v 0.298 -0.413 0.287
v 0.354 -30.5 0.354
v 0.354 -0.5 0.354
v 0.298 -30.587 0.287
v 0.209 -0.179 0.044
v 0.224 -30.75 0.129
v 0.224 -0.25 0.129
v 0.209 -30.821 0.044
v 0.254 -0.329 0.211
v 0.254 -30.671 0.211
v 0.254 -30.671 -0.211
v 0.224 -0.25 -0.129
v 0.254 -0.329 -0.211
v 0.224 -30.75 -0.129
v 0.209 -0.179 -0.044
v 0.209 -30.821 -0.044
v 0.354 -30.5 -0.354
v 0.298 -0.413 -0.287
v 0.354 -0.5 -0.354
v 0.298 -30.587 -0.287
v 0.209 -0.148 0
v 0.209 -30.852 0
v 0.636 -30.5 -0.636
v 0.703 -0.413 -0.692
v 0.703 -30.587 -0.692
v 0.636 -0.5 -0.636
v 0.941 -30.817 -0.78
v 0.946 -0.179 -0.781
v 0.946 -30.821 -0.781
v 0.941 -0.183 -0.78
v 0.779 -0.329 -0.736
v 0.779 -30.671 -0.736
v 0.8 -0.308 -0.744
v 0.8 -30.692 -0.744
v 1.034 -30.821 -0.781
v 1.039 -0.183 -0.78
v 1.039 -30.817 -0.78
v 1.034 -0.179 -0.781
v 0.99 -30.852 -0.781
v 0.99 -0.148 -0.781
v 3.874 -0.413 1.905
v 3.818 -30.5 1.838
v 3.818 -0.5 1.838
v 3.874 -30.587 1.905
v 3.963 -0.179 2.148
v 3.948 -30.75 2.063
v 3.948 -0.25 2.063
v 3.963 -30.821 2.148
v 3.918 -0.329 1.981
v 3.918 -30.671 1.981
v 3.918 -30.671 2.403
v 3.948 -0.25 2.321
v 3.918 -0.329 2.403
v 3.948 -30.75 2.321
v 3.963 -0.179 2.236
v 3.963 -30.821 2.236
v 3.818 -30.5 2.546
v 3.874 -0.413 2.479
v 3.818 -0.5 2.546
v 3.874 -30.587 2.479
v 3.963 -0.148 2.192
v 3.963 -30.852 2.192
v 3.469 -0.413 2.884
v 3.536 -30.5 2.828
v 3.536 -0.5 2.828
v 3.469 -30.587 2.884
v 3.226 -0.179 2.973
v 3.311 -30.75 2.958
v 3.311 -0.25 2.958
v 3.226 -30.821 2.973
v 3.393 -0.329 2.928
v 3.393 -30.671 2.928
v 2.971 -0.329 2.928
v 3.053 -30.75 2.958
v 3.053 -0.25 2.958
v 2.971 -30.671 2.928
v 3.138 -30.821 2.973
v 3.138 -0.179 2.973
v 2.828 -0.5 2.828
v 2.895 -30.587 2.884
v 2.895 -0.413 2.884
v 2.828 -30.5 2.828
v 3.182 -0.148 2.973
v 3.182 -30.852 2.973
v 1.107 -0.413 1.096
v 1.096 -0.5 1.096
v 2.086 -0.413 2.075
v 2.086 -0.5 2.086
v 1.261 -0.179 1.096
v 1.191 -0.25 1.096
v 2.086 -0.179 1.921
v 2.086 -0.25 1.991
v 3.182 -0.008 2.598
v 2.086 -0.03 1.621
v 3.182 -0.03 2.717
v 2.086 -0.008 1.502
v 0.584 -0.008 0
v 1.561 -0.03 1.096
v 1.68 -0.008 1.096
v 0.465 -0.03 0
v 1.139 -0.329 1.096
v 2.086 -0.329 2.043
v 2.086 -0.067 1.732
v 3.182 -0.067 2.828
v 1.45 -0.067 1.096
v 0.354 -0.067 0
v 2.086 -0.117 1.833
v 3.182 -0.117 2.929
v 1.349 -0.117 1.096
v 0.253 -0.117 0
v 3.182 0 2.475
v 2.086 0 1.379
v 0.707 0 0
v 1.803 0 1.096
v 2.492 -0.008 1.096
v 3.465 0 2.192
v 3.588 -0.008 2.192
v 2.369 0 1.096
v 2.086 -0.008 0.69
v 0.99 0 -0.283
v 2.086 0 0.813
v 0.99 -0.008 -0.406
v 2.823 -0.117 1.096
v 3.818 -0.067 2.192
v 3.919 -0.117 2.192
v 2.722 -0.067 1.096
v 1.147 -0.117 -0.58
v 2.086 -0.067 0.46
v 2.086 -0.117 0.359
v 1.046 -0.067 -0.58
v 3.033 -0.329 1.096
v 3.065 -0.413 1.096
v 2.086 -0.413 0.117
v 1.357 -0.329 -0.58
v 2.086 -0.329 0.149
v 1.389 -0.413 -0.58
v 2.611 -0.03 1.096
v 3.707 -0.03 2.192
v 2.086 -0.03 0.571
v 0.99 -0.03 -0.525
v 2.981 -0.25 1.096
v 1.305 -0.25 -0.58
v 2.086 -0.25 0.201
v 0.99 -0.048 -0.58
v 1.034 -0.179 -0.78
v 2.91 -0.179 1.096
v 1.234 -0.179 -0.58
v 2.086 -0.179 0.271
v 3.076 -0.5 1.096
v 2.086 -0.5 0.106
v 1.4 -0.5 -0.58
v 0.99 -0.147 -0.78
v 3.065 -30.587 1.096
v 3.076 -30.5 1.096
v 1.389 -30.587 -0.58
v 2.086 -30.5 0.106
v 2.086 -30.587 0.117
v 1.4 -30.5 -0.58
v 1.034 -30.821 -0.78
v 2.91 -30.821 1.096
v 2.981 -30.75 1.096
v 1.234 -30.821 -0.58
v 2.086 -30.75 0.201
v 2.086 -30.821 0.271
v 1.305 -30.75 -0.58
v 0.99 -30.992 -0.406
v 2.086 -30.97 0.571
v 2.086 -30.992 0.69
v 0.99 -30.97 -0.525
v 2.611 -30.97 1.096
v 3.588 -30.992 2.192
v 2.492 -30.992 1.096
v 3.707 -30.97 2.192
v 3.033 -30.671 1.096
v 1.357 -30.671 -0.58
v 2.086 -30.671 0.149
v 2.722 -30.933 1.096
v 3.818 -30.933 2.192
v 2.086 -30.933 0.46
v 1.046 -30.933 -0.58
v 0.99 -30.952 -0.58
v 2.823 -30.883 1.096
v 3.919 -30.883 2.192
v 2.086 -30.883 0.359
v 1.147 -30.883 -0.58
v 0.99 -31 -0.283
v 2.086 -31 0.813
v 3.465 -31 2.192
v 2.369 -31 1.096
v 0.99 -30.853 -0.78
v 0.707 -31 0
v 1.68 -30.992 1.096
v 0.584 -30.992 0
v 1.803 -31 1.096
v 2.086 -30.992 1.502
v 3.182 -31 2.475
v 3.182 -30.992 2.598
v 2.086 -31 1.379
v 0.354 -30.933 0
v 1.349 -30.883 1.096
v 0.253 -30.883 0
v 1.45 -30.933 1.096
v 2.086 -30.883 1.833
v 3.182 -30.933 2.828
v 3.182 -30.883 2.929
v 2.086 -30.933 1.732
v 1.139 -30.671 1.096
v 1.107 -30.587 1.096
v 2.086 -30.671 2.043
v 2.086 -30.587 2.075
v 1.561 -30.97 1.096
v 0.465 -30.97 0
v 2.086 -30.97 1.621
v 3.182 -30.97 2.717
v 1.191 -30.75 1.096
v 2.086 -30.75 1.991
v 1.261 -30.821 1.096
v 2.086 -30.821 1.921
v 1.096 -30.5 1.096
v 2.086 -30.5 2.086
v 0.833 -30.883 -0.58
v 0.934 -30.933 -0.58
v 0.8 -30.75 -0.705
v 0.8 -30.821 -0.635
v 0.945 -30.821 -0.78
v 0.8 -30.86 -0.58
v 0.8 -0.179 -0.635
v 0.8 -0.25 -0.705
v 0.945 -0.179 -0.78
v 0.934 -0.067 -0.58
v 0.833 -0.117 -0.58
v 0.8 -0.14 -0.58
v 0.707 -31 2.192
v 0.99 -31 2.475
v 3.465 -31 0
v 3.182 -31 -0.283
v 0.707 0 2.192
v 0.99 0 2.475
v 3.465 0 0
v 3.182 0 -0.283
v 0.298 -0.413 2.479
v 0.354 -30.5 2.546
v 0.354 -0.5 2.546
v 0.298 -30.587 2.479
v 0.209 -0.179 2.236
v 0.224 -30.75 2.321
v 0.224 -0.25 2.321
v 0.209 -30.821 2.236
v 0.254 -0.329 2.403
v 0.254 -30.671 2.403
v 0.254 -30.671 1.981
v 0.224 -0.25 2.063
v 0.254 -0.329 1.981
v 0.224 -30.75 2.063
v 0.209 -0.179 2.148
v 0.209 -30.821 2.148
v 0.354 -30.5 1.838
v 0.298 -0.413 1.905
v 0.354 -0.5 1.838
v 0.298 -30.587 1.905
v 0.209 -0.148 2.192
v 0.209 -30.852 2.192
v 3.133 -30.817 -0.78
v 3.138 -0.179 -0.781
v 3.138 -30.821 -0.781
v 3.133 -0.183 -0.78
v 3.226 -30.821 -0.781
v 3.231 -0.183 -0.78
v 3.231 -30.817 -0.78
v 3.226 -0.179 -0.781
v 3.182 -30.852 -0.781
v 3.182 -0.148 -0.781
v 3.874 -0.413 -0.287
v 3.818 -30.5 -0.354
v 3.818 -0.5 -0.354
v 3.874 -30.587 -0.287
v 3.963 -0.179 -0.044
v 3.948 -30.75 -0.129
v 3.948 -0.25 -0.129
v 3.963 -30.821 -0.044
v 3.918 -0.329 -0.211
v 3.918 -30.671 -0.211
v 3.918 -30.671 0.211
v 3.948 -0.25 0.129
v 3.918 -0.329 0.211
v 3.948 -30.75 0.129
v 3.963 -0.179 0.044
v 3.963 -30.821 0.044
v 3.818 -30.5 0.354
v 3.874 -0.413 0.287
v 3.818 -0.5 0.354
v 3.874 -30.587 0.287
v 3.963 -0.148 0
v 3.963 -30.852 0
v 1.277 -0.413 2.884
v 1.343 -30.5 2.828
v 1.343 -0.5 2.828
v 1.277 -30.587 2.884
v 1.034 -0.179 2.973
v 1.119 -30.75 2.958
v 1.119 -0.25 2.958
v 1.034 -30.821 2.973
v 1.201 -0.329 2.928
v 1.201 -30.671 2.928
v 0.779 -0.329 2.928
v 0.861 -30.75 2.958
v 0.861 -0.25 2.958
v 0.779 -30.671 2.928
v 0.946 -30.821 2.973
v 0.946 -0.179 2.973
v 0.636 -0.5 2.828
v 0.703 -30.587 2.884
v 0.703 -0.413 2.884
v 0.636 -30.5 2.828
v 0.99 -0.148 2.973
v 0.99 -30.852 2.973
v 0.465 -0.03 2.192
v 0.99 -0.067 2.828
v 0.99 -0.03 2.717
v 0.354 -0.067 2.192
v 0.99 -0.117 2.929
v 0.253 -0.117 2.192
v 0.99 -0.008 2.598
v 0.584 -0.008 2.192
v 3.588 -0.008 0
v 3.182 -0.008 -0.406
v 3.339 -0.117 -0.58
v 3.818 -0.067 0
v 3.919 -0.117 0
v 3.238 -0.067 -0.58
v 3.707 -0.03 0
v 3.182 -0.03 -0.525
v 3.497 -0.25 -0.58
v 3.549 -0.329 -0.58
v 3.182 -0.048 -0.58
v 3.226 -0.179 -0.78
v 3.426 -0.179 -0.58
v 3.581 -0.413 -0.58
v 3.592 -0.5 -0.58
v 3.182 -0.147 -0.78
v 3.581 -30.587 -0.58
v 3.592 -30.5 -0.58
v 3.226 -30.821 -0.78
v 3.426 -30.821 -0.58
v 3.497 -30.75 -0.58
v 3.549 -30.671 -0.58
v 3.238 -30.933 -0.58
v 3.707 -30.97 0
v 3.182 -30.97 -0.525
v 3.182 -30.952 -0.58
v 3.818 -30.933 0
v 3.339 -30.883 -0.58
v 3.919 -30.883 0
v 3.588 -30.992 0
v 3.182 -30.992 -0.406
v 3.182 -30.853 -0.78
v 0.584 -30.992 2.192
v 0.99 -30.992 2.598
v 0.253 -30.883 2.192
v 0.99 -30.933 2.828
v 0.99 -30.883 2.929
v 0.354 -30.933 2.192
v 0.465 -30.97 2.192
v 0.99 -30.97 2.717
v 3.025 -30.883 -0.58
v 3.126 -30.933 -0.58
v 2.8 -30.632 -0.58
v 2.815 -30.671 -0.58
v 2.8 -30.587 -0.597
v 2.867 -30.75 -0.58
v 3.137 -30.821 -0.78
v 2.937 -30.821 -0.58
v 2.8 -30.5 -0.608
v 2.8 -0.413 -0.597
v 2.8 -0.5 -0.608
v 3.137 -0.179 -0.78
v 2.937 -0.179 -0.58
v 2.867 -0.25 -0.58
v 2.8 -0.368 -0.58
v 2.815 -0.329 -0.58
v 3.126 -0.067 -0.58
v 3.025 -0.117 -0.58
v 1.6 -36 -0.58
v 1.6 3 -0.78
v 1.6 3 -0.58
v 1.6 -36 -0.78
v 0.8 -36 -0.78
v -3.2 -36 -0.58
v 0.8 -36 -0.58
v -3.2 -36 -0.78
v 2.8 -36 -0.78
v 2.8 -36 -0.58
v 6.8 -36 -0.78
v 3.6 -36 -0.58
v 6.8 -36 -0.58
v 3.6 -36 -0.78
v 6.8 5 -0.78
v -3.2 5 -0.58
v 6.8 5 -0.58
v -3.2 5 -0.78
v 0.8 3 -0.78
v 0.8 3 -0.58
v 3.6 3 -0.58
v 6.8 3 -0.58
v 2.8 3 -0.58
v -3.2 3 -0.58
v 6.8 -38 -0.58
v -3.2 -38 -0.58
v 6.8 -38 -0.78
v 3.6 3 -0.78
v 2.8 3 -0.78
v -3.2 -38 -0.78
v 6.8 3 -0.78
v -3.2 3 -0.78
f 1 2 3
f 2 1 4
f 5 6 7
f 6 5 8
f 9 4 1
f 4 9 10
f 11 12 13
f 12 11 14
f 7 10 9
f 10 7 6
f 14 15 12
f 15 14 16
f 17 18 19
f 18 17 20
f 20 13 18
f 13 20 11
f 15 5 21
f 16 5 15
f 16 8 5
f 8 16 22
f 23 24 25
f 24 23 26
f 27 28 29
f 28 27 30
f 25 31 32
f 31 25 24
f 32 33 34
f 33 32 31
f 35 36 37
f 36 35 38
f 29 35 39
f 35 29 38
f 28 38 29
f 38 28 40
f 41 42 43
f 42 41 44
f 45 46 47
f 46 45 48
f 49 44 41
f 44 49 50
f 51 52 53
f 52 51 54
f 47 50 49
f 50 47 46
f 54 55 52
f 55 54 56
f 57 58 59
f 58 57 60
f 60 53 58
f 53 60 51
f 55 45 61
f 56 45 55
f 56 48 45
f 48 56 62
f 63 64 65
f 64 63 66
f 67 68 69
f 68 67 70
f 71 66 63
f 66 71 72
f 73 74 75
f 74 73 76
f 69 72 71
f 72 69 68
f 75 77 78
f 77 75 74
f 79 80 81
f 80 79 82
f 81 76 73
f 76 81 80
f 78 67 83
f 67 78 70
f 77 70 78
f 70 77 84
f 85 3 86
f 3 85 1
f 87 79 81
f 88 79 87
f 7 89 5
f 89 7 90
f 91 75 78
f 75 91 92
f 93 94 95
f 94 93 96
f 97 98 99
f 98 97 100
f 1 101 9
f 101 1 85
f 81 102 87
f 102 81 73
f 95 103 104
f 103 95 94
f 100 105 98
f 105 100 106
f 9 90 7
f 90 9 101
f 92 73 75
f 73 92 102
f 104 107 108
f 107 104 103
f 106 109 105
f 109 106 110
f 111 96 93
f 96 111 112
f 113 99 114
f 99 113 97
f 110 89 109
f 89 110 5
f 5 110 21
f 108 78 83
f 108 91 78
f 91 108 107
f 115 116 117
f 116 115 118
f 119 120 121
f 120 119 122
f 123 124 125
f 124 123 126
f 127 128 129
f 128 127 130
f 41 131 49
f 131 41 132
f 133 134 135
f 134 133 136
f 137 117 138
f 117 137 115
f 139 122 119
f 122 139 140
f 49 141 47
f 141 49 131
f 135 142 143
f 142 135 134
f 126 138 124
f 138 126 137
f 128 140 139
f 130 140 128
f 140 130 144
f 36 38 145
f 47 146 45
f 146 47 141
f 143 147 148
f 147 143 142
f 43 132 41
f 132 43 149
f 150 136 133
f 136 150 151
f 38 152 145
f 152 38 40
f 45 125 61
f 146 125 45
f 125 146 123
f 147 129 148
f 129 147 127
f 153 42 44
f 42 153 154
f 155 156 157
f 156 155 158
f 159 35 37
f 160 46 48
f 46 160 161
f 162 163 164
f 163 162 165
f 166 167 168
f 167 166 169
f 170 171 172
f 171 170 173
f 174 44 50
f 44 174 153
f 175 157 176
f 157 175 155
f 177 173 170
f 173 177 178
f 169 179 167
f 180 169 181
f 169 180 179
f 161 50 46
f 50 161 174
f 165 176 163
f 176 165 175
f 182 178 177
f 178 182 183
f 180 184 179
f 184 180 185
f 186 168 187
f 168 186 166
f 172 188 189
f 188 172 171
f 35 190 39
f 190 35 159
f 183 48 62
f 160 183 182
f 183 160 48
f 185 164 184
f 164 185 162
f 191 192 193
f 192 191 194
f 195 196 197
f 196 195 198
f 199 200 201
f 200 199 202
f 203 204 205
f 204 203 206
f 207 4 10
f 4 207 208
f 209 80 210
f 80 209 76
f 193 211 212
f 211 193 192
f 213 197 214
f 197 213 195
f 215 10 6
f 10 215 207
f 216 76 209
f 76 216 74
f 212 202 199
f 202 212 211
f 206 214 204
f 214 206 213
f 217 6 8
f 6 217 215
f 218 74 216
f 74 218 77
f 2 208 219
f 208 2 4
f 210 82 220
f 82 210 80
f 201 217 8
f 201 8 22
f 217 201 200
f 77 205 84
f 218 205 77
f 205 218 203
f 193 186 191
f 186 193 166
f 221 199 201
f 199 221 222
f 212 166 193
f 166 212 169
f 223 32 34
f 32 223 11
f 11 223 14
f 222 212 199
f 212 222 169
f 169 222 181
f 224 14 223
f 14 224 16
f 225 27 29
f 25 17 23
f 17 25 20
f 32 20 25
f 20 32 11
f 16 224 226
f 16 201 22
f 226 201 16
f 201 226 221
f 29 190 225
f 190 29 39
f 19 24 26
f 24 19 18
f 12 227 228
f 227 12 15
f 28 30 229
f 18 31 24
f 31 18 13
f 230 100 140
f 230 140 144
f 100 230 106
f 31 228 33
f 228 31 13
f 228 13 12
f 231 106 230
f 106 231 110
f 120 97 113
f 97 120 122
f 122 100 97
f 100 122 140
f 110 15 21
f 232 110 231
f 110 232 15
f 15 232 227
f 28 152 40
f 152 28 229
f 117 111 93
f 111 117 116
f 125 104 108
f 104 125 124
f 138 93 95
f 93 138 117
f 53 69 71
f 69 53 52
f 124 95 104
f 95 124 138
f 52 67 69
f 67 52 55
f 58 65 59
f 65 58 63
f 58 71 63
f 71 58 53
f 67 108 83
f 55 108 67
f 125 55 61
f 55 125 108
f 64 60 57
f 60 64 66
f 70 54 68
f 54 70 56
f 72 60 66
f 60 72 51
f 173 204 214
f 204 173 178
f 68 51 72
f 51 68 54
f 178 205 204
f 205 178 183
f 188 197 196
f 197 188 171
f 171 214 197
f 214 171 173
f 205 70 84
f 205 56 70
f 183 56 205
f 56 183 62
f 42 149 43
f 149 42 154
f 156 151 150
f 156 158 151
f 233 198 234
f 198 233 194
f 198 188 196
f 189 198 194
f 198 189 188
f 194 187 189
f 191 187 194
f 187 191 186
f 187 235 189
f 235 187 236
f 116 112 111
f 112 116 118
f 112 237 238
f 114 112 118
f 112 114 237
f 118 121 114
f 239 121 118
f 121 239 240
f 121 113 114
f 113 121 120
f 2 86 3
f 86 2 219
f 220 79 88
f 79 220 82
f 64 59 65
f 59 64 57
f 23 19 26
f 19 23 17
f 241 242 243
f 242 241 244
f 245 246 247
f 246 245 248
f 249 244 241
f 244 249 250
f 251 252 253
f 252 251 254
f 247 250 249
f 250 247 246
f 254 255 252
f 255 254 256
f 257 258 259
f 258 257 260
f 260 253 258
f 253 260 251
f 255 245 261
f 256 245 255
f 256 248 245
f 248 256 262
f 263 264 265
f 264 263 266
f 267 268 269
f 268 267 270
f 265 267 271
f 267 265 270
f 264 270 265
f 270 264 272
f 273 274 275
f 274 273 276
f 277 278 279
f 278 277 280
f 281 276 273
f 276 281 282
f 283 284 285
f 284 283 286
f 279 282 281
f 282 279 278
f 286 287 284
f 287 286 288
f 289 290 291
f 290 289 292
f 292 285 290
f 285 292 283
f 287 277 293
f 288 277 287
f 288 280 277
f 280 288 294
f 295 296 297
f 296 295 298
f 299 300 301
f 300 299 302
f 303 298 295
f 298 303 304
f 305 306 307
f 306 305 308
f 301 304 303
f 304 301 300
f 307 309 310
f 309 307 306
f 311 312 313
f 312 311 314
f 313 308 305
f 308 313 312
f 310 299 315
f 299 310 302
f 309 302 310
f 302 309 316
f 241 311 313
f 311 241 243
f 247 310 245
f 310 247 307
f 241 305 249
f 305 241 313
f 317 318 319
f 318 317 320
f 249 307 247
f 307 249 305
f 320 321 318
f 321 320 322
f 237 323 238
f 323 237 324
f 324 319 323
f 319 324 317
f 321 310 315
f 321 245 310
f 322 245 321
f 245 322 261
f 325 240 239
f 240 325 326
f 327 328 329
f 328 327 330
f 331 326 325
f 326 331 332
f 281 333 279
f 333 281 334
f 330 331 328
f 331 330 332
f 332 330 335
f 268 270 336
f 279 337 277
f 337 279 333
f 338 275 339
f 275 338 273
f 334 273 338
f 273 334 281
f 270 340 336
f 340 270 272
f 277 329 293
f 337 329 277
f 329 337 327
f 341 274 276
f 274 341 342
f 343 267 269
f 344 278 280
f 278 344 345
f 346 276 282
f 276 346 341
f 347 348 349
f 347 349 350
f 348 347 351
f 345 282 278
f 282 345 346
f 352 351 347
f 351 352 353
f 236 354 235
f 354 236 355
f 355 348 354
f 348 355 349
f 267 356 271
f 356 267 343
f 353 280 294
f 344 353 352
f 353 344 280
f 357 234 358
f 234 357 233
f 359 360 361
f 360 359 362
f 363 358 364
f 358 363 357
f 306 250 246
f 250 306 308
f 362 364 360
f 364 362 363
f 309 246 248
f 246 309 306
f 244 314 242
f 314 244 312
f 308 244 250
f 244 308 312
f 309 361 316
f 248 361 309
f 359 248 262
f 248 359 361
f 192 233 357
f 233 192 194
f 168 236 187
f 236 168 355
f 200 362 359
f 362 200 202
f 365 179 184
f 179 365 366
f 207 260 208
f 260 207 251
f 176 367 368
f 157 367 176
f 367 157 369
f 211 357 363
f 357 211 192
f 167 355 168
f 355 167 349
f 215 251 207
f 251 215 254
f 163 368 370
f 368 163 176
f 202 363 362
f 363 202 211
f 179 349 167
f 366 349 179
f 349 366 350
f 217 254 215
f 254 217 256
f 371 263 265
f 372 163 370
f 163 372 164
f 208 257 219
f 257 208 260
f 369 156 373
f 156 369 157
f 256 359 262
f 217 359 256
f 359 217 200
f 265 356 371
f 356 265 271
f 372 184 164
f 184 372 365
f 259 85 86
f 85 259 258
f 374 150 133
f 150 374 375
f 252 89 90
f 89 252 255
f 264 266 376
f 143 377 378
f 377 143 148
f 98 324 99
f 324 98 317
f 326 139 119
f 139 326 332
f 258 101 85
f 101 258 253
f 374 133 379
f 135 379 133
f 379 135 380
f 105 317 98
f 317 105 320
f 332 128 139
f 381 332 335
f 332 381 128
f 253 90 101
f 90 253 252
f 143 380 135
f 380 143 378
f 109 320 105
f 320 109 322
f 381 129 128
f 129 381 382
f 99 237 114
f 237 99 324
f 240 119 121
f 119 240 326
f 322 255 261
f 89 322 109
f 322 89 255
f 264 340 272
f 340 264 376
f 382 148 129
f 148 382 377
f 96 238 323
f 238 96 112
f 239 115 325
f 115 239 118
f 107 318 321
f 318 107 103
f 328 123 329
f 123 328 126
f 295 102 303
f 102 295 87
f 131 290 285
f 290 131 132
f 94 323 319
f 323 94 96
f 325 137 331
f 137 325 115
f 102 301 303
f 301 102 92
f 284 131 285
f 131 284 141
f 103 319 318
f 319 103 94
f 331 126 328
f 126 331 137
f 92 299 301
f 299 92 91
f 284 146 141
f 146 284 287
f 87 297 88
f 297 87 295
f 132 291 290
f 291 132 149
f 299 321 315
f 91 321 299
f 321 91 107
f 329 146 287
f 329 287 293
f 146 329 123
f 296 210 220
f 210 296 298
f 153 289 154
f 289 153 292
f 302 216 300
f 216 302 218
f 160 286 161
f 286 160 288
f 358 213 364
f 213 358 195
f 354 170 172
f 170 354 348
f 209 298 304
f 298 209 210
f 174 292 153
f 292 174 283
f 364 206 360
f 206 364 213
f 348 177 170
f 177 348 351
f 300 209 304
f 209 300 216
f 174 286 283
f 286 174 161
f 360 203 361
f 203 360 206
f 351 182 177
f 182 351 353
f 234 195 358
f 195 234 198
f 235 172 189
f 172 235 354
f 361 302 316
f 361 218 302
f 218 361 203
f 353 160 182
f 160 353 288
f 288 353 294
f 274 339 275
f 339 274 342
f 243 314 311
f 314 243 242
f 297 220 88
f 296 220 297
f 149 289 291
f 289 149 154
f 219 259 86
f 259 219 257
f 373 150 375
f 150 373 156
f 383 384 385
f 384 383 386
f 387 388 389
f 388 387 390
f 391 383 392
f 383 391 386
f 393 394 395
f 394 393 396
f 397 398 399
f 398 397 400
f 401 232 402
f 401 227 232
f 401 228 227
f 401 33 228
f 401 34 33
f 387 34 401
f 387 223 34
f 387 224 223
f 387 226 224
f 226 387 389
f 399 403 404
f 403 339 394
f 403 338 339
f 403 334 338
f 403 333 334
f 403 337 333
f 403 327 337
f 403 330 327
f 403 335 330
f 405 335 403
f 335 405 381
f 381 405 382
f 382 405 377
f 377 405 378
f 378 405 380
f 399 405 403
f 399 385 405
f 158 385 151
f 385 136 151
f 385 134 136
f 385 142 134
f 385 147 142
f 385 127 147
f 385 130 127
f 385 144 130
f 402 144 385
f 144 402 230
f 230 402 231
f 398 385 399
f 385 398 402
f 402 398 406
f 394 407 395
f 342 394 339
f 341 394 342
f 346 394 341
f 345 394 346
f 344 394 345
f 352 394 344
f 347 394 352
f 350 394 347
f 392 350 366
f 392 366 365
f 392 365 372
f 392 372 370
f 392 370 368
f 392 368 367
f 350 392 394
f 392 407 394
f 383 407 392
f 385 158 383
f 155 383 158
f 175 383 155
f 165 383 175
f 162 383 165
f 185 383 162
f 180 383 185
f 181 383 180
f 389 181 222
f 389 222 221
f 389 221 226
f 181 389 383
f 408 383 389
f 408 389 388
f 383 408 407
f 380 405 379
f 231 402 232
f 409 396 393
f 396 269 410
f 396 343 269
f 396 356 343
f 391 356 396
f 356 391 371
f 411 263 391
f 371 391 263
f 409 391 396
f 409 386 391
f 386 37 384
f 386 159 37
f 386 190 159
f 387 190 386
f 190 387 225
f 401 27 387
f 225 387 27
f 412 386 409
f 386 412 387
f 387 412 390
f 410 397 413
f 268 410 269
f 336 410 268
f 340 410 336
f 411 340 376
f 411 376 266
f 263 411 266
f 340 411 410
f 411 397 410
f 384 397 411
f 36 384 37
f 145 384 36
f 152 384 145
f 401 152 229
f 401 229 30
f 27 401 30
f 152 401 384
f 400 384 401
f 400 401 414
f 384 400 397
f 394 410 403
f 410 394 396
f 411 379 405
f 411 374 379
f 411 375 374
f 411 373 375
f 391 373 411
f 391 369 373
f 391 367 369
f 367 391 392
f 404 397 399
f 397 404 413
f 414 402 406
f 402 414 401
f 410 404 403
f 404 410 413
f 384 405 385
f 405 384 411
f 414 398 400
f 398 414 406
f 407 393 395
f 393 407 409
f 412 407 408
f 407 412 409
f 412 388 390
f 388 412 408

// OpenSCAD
// file: lib.scad
// modules not related to bricks

// --  rounded cylinder ---------------------------------------------------------------------------------------

// produces a cylinder in 3 sections
// d: base diameter
// h: total height
// rt: top section height
// rtw: top section diameter difference
// rb: bottom section height
// rbw: bottom section diameter difference
module rounded_cylinder(d,h,rt,rtw,rb,rbw,fn=36){
    cylinder(d2=d,d1=d-rbw,h=rb,$fn=fn);
    translate([0,0,rb])
    cylinder(d=d,h=h-rb-rt,$fn=fn);
    translate([0,0,h-rt])
    cylinder(d1=d,d2=d-rtw,h=rt,$fn=fn);    
}


// -- roundedcube ----------------------------------------------------------------------------------------------



// rounded cube --
// original idea:
// https://stackoverflow.com/questions/33146741/way-to-round-edges-of-objects-openscad


module __neg_round_edge(height,radius,fn=36){
  difference(){
    translate([-.5,-.5,0])
      cube([radius+.5,radius+.5,height]);
      translate([radius,radius,height/2+1]) cylinder(height+3,radius,radius,true,$fn=fn);
   }
}


module __neg_round_edges(xx,yy,zz,radius,cf=[1,1,1,1]){
  if (cf[0]>0) 
    __neg_round_edge(zz,cf[0]*radius);  
  if (cf[1]>0) 
    translate([xx,0,0]) rotate([0,0,90]) __neg_round_edge(zz,cf[1]*radius);  
  if (cf[2]>0) 
     translate([xx,yy,0]) rotate([0,0,180]) __neg_round_edge(zz,cf[2]*radius);  
  if (cf[3]>0) 
     translate([0,yy,0]) rotate([0,0,270]) __neg_round_edge(zz,cf[3]*radius);      
}

module __neg_rounded_cube(xx, yy, zz, radius,top=true,bottom=true,x=[1,1,1,1],y=[1,1,1,1],z=[1,1,1,1]) {
     __neg_round_edges(xx,yy,zz,radius,x);
    translate([0,yy,0]) rotate([90,0,0]) __neg_round_edges(xx,zz,yy,radius,y);
    translate([0,0,zz]) rotate([0,90,0]) __neg_round_edges(zz,yy,xx,radius,x);
}



// produces a cube with round corners
// xx:width
// yy:length
// zz:depth
// radius: radius of the corners
// z,y,z: allow to turn off rounding for some specific corners TODO remove
module rounded_cube(xx, yy, zz, radius,x=[1,1,1,1],y=[1,1,1,1],z=[1,1,1,1]) {
  difference(){
    cube([xx,yy,zz]);
    __neg_rounded_cube(xx,yy,zz,radius,x,y,z);
  }
}



// -- rounded_square_tube -----------------------------------------------------------------------------------

// produces a vertical square tube with rounded corners
// params:
// w:width
// l:length
// h:height
// t:thickness of wall
// r:radius of rounded corner
// fill: whether it is empty or not

module rounded_square_tube(w,l,h,t,r,fill=false){

  
  __roundedcorner(r,h,t,fill=fill);
    
  translate([w,0,0]) mirror([1,0,0]) __roundedcorner(r,h,t,fill=fill);
    
  translate([0,l,0]) mirror([0,1,0]) __roundedcorner(r,h,t,fill=fill);
  translate([w,l,0]) mirror([1,1,0]) __roundedcorner(r,h,t,fill=fill);
    
  if (fill){
    translate([r,0,0]) cube([w-r-r,l,h]);
    translate([0,r,0]) cube([w,l-r-r,h]);
  } else {
    translate([0,r,0]) cube([t,l-r-r,h]);
    translate([w-t,r,0]) cube([t,l-r-r,h]);
    translate([r,0,0]) cube([w-r-r,t,h]);
    translate([r,l-t,0]) cube([w-r-r,t,h]);
  }
}

// just a single rounded corner
// r: radiuse
// h:height
// t:thickness
// fill: if true t is ignored and the inner part of the curve is filled
module __roundedcorner(r,h,t,fill=false){

  intersection(){
    cube([r,r,h]);
    translate([r,r,0]){

    difference(){
        cylinder(d=r+r,h=h,$fn=24);
        if (!fill)
            translate([0,0,-1]) cylinder(d=r+r-t-t,h=h+2,$fn=24);
      }
    }
  }
}


// tests
translate([0,0,0]) rounded_cylinder(d=10,h=20,rt=10,rtw=5,rb=2,rbw=2);
translate([10,0,0]) rounded_cube(xx=5,yy=10,zz=20,radius=1);
translate([20,0,0])  rounded_square_tube(20,10,2,1,3,fill=false);
// main file
use <lib.scad>;

// create a bar
// u: units 
module bar(u){
    
    
 l=u*8-1;   
 rotate([90,45,0])
    union(){
 t=1.8-0.4;
 d=4.7-0.2;   
 r=0.5;   
 rounded_cube(t,d,l,r);
 translate([+t/2-d/2,-t/2+d/2])
 rounded_cube(d,t,l,r);
    
 // support 
    rotate([0,0,45])
        translate([0.8,-0.78,0])
    union(){
    translate([0,0,-5]) cube([0.8,0.2,l+10]);
    translate([2,0,-5]) cube([0.8,0.2,l+10]);
    translate([-4,0,-5]) 
        cube([10,0.2,2]);
    translate([-4,0,l+5]) 
        cube([10,0.2,2]);    
    }
}
}

// --  test --
bar(4);
